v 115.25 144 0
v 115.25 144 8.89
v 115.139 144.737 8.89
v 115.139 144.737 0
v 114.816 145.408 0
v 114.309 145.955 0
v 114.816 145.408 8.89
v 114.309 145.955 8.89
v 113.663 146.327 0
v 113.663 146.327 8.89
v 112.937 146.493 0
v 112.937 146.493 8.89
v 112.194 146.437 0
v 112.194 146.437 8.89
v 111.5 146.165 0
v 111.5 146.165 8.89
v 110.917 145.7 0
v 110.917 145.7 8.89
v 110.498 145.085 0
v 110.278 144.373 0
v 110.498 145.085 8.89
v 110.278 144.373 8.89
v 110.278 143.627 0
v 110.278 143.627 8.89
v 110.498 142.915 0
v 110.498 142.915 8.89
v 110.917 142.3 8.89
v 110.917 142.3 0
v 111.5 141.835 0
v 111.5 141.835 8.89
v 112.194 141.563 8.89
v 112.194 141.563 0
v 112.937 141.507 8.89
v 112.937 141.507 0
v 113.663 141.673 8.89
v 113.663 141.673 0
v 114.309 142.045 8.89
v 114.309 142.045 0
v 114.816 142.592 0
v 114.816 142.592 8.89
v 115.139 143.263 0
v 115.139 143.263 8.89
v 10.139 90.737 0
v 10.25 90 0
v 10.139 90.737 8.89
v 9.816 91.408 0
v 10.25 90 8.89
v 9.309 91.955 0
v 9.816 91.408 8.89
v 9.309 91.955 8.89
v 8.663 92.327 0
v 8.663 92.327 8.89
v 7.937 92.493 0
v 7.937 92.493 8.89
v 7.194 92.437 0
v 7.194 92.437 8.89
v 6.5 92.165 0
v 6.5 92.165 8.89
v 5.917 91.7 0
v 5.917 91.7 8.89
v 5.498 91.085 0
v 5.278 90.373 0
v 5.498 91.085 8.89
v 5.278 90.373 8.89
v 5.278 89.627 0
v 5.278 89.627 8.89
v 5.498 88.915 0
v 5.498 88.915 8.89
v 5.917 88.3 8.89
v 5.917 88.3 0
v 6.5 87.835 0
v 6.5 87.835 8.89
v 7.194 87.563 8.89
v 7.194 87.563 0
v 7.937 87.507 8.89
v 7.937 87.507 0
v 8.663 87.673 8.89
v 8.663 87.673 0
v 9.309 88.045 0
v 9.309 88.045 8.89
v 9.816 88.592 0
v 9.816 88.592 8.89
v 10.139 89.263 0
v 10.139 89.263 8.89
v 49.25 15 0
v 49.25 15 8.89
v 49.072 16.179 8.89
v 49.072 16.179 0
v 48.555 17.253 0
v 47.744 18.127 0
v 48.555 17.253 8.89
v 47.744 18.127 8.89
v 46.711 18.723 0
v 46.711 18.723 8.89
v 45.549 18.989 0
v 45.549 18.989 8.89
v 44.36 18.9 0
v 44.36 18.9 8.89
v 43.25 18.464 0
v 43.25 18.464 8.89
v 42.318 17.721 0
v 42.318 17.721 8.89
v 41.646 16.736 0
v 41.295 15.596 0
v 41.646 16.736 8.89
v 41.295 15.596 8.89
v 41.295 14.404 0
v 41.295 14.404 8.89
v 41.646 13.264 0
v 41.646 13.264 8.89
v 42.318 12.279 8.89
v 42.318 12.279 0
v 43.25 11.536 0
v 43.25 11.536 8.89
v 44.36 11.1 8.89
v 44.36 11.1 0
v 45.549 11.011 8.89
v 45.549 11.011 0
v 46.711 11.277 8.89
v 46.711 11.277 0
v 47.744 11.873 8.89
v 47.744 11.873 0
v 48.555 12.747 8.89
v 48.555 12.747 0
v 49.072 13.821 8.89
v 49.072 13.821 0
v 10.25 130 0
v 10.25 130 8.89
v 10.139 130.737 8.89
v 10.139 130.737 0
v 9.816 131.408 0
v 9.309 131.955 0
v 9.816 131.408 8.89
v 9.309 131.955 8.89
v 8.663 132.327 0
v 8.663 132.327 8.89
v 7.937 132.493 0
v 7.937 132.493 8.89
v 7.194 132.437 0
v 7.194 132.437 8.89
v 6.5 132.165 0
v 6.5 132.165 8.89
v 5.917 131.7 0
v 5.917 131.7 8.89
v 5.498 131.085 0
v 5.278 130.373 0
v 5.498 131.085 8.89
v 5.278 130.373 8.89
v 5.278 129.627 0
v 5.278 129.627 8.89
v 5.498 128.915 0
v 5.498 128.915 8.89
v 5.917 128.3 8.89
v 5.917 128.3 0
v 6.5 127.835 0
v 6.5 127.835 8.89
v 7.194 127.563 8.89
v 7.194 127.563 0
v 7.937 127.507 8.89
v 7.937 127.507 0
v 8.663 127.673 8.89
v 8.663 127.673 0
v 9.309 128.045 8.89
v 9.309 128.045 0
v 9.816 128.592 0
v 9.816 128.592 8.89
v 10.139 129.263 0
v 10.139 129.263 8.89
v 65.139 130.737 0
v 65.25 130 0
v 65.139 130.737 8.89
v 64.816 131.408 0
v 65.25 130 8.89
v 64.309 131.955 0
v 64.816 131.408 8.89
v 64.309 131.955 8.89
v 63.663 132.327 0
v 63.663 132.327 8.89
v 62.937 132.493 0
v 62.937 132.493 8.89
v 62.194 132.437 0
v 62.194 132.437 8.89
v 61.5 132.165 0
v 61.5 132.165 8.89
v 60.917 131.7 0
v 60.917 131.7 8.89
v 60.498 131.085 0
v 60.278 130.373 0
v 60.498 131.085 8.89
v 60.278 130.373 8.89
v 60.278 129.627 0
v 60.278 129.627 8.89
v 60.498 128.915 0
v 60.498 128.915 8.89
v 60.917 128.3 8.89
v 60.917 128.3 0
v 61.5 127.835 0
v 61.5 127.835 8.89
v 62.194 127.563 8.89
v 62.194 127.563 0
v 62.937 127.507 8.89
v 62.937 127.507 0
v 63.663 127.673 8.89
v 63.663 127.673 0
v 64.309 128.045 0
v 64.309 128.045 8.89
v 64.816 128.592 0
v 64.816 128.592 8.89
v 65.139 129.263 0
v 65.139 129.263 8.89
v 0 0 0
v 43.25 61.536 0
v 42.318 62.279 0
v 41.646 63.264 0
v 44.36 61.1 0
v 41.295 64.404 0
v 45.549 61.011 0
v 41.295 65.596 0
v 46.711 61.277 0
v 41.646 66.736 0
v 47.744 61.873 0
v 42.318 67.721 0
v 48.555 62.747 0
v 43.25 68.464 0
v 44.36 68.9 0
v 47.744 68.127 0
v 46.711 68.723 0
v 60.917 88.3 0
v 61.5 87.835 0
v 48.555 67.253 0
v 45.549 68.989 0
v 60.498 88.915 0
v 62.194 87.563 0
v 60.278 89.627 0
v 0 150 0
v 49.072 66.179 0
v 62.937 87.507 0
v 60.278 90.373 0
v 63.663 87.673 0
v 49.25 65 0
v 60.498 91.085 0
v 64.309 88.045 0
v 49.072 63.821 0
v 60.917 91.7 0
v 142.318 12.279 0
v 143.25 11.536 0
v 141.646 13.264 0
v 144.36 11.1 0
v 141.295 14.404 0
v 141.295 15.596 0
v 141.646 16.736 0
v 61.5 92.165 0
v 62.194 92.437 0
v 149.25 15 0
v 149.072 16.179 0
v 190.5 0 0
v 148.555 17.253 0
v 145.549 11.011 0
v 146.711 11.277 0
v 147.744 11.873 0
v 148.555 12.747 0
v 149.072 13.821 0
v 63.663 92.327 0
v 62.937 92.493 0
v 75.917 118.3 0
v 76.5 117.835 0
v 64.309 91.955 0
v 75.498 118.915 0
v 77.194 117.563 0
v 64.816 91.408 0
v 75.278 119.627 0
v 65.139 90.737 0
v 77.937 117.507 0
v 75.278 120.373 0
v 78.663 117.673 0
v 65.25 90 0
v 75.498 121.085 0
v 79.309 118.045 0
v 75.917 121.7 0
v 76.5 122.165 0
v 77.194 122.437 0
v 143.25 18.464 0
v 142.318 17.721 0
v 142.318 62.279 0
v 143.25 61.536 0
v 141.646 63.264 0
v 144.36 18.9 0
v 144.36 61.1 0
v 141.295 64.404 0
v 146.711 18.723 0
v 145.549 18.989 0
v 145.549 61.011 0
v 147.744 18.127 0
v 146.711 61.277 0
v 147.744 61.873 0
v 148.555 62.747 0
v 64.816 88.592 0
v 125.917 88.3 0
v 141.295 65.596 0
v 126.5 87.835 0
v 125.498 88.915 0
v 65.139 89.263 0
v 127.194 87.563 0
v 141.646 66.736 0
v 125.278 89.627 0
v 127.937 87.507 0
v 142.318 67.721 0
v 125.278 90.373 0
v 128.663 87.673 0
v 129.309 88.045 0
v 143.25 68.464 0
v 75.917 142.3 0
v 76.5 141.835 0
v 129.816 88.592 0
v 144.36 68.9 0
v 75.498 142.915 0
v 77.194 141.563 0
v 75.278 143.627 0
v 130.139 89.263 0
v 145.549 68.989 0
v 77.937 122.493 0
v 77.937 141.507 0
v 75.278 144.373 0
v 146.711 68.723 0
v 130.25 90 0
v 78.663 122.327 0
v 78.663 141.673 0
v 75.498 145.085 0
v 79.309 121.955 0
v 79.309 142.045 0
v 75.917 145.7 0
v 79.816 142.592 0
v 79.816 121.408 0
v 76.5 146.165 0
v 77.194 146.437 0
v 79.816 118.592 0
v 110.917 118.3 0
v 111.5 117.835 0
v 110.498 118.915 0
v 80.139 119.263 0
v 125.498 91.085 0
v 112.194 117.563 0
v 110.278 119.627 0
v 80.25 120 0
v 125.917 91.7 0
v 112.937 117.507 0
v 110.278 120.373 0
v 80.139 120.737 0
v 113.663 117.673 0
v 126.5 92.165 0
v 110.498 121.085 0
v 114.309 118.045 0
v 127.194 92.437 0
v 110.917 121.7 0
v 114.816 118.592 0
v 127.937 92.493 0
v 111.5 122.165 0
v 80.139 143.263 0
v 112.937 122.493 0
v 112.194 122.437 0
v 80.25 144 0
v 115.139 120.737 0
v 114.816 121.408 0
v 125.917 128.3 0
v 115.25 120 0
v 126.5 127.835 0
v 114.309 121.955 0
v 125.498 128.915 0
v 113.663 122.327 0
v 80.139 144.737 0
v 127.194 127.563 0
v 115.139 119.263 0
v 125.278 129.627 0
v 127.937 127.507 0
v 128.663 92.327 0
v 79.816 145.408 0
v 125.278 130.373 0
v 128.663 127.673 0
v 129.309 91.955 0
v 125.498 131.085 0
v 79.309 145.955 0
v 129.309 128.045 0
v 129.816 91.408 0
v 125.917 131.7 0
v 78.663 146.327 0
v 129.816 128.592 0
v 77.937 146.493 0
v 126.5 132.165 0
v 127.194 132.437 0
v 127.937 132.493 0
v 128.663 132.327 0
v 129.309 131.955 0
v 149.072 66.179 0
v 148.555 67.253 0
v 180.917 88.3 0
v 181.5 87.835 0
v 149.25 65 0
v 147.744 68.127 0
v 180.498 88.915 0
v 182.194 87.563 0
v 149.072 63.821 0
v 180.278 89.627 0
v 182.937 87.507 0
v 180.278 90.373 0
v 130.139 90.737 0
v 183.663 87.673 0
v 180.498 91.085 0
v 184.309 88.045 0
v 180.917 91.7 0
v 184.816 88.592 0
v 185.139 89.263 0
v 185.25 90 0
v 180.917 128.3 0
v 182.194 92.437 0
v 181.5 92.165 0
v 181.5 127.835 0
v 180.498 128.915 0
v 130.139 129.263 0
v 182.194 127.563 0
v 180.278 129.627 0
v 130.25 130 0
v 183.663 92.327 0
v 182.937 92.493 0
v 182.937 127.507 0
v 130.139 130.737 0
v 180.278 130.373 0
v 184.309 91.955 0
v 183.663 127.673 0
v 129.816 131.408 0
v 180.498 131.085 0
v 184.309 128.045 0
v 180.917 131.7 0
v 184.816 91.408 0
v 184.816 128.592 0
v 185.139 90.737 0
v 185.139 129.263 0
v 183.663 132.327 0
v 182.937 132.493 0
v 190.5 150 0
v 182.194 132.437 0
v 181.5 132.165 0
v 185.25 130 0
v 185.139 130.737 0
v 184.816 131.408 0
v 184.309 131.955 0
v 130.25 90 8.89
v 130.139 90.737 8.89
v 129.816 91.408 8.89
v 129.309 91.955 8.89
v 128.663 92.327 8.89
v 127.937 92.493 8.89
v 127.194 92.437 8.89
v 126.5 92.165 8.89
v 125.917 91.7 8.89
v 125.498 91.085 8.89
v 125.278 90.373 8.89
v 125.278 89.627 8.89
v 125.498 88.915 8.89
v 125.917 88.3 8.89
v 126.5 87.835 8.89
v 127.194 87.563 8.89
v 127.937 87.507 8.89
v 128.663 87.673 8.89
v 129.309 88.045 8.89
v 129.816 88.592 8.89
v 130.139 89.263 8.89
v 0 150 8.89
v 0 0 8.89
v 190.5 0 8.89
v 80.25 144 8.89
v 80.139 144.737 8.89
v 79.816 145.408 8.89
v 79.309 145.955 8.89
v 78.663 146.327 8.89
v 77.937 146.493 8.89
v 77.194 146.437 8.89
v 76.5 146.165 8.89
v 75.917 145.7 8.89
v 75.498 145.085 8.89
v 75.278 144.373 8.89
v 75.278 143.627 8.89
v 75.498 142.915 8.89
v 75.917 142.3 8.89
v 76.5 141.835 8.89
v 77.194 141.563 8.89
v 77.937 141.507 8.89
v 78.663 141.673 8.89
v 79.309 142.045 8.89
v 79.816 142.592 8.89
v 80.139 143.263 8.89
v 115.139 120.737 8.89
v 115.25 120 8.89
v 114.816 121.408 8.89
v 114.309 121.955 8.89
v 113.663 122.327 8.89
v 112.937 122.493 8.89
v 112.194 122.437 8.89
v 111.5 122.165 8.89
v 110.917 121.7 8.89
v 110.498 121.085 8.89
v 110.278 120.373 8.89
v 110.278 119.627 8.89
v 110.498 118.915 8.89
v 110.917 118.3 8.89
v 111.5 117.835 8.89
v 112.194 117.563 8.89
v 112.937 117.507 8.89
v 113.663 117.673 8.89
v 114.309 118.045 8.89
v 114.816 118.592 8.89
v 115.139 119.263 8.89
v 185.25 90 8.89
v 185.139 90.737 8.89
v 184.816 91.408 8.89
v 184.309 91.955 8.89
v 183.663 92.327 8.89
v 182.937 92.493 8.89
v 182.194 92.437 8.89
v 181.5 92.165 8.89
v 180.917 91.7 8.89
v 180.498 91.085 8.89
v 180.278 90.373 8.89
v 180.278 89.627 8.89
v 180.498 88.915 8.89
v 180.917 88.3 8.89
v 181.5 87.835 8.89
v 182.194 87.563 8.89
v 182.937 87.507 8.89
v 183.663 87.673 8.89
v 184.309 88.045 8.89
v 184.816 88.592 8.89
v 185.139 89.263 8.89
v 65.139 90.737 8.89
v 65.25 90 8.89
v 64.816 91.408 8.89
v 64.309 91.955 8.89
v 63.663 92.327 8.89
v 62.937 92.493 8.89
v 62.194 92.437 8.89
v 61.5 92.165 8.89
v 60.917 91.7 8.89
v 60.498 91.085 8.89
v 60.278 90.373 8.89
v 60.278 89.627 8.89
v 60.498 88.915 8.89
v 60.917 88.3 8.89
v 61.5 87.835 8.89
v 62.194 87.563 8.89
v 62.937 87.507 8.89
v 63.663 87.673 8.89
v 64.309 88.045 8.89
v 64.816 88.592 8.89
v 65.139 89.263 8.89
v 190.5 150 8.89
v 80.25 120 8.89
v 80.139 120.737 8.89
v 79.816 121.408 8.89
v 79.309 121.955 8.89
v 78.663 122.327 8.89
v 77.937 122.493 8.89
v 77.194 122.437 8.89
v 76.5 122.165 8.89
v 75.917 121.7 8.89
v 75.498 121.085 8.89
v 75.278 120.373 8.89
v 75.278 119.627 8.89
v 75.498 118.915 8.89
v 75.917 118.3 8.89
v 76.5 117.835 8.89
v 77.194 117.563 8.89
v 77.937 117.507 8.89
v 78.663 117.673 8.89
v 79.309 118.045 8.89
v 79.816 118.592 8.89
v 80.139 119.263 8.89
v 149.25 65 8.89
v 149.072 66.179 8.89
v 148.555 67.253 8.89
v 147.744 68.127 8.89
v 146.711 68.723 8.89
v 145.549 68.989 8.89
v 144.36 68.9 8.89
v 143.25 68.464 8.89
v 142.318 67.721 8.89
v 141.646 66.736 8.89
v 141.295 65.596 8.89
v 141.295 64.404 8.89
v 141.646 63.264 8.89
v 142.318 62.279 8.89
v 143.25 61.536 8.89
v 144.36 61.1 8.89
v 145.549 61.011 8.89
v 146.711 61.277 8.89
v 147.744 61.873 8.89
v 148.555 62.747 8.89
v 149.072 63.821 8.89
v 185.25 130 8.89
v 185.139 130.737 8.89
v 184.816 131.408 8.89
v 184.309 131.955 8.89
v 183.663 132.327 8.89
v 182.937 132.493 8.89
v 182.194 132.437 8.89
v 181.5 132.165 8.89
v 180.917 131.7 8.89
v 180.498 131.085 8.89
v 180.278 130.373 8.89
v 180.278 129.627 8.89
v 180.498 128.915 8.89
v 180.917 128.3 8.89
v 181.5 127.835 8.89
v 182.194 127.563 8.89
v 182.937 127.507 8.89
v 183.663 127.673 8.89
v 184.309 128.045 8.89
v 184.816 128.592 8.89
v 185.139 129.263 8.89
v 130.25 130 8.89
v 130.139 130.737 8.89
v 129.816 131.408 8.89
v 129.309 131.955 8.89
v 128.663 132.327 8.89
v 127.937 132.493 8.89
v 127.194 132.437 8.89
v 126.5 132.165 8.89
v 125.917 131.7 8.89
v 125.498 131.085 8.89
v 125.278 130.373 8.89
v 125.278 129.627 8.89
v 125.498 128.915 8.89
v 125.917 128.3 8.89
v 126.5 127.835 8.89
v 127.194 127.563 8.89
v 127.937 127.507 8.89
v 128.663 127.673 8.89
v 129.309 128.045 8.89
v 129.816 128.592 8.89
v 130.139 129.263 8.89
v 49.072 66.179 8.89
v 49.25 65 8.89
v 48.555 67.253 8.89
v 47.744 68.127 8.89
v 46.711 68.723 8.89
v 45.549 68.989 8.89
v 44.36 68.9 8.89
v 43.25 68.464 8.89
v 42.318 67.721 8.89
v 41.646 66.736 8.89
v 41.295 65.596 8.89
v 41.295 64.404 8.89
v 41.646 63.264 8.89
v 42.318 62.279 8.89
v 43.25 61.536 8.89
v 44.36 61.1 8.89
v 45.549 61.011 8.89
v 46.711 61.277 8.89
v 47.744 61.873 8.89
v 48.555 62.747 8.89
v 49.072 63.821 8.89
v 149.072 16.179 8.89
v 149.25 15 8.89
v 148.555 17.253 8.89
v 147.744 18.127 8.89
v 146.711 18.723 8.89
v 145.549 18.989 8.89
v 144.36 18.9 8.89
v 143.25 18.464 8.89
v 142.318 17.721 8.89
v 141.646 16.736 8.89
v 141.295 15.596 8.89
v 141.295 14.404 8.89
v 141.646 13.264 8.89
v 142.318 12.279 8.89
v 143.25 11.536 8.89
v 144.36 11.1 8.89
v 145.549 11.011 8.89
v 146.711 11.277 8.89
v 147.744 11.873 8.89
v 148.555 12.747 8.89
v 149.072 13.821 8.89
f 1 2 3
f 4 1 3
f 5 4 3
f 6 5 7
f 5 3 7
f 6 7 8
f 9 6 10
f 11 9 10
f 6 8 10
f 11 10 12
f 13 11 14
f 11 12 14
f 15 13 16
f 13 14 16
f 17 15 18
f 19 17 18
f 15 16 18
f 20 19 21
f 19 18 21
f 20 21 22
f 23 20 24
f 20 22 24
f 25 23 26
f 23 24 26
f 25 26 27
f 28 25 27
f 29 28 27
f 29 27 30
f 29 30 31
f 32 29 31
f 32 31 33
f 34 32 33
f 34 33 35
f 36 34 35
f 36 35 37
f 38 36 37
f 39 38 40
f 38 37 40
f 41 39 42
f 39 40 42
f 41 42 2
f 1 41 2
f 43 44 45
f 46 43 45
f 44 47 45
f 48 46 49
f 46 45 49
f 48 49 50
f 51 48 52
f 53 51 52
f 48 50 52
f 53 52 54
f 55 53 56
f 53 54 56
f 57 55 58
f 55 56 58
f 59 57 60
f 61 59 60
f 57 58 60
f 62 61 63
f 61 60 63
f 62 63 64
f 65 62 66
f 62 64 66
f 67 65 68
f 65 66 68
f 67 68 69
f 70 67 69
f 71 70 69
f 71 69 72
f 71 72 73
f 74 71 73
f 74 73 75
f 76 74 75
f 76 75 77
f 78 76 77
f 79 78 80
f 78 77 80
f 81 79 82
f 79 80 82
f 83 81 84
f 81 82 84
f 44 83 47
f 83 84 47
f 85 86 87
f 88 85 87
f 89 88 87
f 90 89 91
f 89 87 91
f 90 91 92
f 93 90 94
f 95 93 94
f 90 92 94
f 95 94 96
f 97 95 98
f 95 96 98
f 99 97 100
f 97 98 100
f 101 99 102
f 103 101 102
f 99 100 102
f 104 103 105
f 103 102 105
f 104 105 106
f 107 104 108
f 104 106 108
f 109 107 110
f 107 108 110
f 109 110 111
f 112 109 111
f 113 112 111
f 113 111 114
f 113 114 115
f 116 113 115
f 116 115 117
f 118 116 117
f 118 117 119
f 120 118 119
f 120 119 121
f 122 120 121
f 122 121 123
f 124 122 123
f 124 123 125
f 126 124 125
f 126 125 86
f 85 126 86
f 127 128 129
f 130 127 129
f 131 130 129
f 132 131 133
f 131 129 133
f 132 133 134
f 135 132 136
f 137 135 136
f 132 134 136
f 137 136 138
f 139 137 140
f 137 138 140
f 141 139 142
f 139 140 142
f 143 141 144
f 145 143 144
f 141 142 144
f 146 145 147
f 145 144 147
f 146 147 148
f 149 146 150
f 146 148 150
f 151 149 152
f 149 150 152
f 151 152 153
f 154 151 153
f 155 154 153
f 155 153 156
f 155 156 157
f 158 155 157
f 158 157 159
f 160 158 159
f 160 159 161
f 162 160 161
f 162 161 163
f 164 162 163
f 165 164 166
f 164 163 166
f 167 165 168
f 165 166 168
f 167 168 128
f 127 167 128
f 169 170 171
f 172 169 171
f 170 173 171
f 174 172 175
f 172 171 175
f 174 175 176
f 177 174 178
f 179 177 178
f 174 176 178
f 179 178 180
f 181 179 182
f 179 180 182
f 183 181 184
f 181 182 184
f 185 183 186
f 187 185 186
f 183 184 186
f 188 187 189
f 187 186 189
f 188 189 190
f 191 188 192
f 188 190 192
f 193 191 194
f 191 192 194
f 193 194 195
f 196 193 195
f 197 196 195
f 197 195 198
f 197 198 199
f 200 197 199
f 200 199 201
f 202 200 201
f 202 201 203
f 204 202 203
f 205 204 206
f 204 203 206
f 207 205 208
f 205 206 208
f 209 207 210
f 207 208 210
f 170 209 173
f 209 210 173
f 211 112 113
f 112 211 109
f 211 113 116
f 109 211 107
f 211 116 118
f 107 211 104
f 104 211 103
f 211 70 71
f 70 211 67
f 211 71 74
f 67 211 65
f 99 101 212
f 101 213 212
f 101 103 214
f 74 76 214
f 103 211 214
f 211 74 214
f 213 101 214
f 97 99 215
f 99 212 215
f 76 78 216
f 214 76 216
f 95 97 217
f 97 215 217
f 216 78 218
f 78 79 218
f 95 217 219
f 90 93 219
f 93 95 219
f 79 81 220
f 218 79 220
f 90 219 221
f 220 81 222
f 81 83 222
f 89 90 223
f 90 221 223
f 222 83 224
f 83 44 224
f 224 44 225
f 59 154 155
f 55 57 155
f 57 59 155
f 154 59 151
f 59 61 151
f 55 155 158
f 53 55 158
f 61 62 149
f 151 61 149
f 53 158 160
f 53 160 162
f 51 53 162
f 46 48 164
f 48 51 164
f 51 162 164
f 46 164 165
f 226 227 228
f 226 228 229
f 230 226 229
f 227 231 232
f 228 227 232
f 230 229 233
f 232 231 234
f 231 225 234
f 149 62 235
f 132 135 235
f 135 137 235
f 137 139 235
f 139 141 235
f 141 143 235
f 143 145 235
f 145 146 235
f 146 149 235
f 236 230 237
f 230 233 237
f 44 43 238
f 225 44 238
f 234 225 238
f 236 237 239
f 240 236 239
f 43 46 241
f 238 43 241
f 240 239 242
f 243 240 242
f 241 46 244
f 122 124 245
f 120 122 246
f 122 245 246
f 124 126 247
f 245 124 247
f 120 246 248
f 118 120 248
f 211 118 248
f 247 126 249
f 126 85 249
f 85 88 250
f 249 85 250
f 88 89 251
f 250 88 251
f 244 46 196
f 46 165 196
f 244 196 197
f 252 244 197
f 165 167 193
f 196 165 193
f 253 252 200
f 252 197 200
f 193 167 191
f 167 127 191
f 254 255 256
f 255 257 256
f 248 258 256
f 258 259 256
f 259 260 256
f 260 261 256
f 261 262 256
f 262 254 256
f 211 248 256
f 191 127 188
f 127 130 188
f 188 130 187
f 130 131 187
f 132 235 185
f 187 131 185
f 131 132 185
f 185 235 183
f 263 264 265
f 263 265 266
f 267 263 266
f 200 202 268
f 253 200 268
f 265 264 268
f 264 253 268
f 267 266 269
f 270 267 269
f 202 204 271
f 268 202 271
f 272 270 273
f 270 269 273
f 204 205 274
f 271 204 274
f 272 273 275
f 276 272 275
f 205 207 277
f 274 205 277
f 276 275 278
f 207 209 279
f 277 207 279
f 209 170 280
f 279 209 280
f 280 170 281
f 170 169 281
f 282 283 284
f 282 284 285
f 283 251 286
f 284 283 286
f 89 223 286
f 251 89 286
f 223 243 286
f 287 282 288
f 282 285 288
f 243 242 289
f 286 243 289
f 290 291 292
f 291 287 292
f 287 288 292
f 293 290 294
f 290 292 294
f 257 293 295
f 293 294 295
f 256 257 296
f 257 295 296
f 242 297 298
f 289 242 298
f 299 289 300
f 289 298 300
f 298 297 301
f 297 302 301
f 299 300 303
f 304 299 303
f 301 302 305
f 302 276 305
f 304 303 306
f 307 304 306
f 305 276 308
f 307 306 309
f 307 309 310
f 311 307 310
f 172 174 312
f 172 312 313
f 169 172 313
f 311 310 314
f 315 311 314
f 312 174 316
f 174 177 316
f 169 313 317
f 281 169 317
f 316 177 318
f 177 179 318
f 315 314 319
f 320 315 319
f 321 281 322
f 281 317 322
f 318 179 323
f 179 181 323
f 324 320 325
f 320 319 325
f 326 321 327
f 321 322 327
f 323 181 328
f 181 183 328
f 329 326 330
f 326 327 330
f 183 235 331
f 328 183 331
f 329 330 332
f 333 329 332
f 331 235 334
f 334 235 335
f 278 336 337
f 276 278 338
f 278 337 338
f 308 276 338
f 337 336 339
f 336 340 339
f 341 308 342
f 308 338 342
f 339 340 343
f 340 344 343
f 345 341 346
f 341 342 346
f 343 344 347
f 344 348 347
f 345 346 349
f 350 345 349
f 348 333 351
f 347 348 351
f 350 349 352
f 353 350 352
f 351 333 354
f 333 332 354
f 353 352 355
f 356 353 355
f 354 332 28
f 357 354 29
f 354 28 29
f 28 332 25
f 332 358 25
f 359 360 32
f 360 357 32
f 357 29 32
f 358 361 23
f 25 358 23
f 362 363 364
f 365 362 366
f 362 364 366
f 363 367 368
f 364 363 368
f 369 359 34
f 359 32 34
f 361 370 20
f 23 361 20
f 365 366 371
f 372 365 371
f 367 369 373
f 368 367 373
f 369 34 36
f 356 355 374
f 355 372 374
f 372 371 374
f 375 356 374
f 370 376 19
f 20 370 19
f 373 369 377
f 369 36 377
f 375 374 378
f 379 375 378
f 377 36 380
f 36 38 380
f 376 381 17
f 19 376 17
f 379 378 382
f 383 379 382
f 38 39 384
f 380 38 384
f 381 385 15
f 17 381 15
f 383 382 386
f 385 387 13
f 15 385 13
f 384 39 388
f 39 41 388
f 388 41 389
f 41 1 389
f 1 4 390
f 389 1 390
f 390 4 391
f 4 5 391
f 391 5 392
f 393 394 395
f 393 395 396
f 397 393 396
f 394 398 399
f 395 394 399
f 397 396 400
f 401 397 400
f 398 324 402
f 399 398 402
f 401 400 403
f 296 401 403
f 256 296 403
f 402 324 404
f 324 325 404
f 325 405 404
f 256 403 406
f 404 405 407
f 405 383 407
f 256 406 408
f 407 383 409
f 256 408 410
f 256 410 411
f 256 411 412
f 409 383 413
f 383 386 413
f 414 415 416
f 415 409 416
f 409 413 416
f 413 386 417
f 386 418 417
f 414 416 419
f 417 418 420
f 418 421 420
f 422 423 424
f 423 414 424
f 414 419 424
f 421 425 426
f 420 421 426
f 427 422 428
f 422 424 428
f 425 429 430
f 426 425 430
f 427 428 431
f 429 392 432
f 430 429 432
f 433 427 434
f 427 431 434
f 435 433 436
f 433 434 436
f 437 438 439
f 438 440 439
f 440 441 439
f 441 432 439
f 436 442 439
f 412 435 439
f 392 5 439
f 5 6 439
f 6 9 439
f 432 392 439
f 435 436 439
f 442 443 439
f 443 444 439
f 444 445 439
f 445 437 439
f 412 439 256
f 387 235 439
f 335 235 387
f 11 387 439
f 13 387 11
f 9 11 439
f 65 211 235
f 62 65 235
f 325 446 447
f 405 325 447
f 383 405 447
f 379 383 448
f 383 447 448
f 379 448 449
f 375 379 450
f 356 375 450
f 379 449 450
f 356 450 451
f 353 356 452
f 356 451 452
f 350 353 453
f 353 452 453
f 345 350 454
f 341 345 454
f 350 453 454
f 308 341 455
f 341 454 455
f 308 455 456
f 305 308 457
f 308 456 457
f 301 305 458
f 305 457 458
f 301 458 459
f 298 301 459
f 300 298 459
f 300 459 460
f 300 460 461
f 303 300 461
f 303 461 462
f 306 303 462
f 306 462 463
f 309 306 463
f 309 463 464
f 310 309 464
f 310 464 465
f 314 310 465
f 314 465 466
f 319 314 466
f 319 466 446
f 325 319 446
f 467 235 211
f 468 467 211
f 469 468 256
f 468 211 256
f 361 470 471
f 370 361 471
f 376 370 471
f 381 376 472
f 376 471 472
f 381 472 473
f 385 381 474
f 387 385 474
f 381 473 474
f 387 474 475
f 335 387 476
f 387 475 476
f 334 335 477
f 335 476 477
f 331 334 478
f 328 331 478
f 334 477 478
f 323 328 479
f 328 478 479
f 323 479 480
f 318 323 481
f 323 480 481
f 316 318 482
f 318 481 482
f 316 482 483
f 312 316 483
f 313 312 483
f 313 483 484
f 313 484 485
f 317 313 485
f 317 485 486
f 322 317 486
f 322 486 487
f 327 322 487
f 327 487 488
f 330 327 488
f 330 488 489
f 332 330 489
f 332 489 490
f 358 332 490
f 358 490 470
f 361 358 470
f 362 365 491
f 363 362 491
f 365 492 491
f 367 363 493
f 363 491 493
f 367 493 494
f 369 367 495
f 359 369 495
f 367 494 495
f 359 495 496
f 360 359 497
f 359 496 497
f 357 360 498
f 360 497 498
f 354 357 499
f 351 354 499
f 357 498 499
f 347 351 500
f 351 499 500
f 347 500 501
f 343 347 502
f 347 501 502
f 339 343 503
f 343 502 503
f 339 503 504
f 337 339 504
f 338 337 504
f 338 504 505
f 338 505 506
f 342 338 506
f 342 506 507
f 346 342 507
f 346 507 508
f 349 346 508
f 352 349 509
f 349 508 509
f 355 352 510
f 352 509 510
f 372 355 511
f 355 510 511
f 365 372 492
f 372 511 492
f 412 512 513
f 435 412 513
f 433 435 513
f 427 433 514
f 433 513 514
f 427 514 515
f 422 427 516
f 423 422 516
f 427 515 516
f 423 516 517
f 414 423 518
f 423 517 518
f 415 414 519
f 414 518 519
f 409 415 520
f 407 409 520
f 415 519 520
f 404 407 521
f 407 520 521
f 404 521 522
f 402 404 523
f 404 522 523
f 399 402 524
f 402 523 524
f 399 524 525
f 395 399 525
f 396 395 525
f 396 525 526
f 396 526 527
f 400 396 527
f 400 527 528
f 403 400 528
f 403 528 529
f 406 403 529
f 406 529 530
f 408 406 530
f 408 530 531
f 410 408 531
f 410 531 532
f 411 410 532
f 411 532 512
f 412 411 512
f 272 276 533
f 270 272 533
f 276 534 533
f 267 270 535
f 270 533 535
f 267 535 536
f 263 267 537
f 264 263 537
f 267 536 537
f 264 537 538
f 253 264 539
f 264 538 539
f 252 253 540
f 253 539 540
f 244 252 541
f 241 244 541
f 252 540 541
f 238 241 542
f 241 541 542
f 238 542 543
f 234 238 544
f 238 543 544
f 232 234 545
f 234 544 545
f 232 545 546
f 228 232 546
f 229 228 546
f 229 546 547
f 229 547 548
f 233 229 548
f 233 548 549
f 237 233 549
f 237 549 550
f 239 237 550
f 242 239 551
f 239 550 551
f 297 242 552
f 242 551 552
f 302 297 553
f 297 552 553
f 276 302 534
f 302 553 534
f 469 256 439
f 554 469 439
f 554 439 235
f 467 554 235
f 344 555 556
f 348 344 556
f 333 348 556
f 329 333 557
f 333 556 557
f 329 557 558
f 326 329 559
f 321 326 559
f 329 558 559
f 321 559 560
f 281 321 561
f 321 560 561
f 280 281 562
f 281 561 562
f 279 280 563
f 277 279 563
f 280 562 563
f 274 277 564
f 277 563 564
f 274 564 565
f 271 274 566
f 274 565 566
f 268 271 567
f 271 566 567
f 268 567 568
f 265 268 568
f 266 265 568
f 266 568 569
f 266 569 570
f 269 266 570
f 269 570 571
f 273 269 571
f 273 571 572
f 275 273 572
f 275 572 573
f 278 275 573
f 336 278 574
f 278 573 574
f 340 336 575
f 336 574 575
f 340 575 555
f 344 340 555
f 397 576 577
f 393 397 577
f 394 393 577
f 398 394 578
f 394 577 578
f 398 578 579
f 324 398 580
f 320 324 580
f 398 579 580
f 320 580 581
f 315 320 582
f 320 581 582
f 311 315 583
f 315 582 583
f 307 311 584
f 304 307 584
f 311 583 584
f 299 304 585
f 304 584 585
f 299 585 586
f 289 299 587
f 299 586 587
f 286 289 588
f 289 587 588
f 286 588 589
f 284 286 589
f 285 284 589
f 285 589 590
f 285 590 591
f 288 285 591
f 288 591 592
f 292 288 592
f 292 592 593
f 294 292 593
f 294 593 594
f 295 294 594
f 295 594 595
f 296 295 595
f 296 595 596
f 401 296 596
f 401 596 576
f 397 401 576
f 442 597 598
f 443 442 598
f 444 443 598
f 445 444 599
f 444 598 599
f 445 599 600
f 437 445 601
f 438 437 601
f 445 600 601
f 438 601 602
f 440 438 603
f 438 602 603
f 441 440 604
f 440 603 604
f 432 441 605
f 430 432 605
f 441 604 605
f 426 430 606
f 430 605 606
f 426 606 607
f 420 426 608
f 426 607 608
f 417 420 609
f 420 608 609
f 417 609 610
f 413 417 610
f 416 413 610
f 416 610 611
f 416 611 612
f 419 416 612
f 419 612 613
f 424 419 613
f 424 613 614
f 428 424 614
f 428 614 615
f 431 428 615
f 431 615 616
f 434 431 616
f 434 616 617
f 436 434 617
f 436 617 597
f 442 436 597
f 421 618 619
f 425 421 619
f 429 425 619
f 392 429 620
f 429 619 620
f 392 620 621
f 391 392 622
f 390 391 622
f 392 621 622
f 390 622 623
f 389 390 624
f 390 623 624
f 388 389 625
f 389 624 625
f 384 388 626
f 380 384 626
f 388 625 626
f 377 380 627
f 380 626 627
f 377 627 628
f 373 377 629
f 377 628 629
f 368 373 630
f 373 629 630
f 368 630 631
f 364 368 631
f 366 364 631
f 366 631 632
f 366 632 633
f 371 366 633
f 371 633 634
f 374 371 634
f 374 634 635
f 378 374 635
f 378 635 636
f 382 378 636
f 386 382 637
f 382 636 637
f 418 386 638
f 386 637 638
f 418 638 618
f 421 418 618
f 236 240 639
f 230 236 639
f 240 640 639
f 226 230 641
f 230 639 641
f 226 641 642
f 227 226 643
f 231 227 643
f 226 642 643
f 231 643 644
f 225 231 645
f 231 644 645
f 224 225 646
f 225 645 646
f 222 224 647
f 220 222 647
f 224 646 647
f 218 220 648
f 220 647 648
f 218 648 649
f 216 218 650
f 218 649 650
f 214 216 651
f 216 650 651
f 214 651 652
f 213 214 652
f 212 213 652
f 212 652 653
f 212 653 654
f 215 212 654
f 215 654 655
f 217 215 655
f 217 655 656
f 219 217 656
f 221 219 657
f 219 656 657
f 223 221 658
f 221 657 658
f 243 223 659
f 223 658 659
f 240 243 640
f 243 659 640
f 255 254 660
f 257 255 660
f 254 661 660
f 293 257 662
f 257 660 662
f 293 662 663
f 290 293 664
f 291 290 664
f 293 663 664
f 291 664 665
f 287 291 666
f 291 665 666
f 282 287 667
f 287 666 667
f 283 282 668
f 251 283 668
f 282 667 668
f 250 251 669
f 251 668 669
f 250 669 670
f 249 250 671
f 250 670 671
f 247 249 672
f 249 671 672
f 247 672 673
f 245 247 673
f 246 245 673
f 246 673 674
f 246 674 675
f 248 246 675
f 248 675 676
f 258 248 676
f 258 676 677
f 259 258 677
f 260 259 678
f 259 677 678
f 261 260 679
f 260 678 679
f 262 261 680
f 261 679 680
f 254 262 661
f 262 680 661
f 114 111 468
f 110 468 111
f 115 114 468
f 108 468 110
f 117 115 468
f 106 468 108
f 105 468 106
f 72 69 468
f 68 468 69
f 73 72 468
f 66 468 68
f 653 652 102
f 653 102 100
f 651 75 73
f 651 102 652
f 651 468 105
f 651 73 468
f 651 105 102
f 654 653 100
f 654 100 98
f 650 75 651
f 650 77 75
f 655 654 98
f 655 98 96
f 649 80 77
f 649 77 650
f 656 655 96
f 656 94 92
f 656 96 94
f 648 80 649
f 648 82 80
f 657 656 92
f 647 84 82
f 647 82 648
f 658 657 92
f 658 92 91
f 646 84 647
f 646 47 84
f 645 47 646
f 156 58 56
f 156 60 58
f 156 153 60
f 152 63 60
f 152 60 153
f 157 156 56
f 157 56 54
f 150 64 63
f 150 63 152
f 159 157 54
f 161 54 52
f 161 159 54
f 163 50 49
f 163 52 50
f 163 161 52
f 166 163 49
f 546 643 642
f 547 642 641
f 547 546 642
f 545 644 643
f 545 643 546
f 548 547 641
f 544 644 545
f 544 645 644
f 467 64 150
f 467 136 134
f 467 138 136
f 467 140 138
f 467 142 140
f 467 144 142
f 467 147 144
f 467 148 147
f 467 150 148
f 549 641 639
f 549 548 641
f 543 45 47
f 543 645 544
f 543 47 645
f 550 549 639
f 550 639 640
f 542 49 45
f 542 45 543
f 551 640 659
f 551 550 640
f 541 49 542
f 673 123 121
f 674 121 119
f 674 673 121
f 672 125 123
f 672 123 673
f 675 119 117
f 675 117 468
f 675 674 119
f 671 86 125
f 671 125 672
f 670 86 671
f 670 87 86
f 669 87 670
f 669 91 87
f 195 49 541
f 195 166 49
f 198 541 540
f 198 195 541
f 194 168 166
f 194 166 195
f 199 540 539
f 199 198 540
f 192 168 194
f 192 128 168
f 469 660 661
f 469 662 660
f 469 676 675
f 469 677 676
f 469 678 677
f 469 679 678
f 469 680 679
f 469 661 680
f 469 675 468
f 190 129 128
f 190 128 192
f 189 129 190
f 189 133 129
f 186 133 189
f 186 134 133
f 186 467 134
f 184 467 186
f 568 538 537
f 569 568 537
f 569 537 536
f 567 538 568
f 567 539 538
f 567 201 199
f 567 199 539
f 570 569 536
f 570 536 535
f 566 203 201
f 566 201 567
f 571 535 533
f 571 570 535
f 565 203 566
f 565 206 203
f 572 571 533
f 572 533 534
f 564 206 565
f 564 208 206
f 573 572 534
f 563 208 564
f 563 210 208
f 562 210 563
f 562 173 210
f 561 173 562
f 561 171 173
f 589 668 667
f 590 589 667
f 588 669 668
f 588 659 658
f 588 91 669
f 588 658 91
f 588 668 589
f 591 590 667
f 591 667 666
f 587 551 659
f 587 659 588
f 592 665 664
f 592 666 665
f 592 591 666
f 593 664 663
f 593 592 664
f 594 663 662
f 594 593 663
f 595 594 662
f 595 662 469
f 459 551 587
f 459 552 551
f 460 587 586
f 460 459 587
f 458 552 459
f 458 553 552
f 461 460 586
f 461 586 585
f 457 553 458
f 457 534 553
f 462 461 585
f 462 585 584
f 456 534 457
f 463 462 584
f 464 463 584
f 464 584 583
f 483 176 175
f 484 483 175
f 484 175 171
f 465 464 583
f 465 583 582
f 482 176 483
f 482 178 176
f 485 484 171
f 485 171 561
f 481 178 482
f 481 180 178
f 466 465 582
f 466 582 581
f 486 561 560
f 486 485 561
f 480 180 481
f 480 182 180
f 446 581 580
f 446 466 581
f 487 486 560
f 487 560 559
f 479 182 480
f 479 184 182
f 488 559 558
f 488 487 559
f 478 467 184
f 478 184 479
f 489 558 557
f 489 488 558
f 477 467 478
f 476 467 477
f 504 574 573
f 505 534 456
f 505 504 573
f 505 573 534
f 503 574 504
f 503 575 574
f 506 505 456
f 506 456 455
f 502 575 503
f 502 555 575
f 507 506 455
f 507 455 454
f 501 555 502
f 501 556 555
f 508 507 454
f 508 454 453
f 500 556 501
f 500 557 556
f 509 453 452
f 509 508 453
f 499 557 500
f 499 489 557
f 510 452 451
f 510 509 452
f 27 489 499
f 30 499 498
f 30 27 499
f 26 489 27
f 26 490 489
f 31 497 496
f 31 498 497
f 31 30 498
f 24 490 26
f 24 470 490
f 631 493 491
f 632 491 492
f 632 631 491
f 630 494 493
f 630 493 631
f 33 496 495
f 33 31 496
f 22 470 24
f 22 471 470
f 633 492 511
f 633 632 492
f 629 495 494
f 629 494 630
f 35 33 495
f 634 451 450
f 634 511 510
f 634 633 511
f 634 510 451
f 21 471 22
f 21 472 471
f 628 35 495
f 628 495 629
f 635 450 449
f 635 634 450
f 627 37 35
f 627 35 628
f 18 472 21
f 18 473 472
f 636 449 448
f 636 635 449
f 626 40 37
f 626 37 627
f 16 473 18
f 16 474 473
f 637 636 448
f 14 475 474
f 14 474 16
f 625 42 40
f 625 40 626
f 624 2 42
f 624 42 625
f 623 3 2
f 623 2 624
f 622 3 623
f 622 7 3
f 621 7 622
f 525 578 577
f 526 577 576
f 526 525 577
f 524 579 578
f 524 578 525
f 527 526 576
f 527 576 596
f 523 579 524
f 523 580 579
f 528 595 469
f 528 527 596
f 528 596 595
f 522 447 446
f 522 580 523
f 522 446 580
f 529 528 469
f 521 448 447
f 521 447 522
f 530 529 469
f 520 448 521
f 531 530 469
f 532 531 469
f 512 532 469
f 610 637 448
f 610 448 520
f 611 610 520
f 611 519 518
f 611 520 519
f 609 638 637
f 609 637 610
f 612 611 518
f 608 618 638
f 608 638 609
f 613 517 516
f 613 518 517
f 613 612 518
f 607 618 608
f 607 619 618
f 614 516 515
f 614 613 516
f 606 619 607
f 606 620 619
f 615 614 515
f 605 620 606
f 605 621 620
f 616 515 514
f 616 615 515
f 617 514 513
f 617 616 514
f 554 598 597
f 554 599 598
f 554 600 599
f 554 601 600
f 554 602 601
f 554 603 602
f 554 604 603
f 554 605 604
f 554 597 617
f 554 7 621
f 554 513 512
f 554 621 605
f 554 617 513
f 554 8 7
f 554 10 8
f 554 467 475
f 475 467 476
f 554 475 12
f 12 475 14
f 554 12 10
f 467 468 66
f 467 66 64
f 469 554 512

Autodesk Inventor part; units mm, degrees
ref_plane "YZ Plane" through (0, 0, 0) normal (1, 0, 0) x (0, 1, 0)
ref_plane "XZ Plane" through (0, 0, 0) normal (0, 1, 0) x (-1, 0, 0)
ref_plane "XY Plane" through (0, 0, 0) normal (0, 0, 1) x (1, 0, 0)
sketch "Sketch1" plane through (0, 0, 0) normal (0, 0, 1) x (1, 0, 0)
  line L0 (0, 0) -> (190.5, 0)
  line L1 (190.5, 0) -> (190.5, 150)
  line L2 (190.5, 150) -> (0, 150)
  line L3 (0, 150) -> (0, 0)
  dimension "d0" = 150
  dimension "d1" = 190.5
extrude "Extrusion1" add sketch "Sketch1" along normal blind 8.89
sketch "Sketch2" plane through (0, 0, 8.89) normal (0, 0, 1) x (1, 0, 0)
  line L0 (45.25, 15) -> (145.25, 15) construction
  line L1 (145.25, 15) -> (145.25, 65) construction
  line L2 (145.25, 65) -> (45.25, 65) construction
  line L3 (45.25, 65) -> (45.25, 15) construction
  line L4 (190.5, 150) -> (0, 150) construction
  line L5 (190.5, 0) -> (190.5, 150) construction
  circle A0 centre (45.25, 65) radius 4
  circle A1 centre (145.25, 65) radius 4
  circle A2 centre (45.25, 15) radius 4
  circle A3 centre (145.25, 15) radius 4
  line L6 (0, 0) -> (190.5, 0) projected
  point P0 (95.25, 65)
  point P1 (95.25, 150)
  point P2 (145.25, 40)
  dimension "d4" = 100
  dimension "d5" = 50
  dimension "d6" = 8
  dimension "d23" = 15
extrude "Extrusion2" cut sketch "Sketch2" against normal up to surface (8.89 mm away)
sketch "Sketch3" plane through (0, 0, 8.89) normal (0, 0, 1) x (1, 0, 0)
  line L0 (7.75, 90) -> (62.75, 90) construction
  line L1 (62.75, 90) -> (62.75, 130) construction
  line L2 (62.75, 130) -> (7.75, 130) construction
  line L3 (7.75, 130) -> (7.75, 90) construction
  circle A0 centre (7.75, 130) radius 2.5
  circle A1 centre (62.75, 130) radius 2.5
  circle A2 centre (7.75, 90) radius 2.5
  circle A3 centre (62.75, 90) radius 2.5
  line L4 (190.5, 150) -> (0, 150) construction
  line L5 (95.25, 150) -> (95.25, 0)
  line L6 (0, 0) -> (190.5, 0) construction
  circle A4 centre (182.75, 130) radius 2.5
  circle A5 centre (127.75, 130) radius 2.5
  circle A6 centre (182.75, 90) radius 2.5
  circle A7 centre (127.75, 90) radius 2.5
  point P0 (62.75, 110)
  point P1 (35.25, 130)
  dimension "d9" = 5
  dimension "d10" = 55
  dimension "d11" = 40
  dimension "d12" = 60
  dimension "d22" = 20
extrude "Extrusion3" cut sketch "Sketch3" against normal up to surface (8.89 mm away)
sketch "Sketch4" plane through (0, 0, 8.89) normal (0, 0, 1) x (1, 0, 0)
  line L0 (77.75, 120) -> (112.75, 120) construction
  line L1 (112.75, 120) -> (112.75, 144) construction
  line L2 (112.75, 144) -> (77.75, 144) construction
  line L3 (77.75, 144) -> (77.75, 120) construction
  circle A0 centre (112.75, 120) radius 2.5
  circle A1 centre (112.75, 144) radius 2.5
  circle A2 centre (77.75, 144) radius 2.5
  circle A3 centre (77.75, 120) radius 2.5
  line L4 (190.5, 150) -> (0, 150) construction
  line L5 (190.5, 0) -> (190.5, 150) construction
  point P0 (0, 0)
  point P1 (95.25, 120)
  point P2 (95.25, 150)
  point P3 (190.5, 75)
  point P4 (112.75, 132)
  dimension "d15" = 5
  dimension "d16" = 35
  dimension "d17" = 24
  dimension "d18" = 6
extrude "Extrusion4" cut sketch "Sketch4" against normal up to surface (8.89 mm away)
properties part number "Spindle_Mounting_Plate"
